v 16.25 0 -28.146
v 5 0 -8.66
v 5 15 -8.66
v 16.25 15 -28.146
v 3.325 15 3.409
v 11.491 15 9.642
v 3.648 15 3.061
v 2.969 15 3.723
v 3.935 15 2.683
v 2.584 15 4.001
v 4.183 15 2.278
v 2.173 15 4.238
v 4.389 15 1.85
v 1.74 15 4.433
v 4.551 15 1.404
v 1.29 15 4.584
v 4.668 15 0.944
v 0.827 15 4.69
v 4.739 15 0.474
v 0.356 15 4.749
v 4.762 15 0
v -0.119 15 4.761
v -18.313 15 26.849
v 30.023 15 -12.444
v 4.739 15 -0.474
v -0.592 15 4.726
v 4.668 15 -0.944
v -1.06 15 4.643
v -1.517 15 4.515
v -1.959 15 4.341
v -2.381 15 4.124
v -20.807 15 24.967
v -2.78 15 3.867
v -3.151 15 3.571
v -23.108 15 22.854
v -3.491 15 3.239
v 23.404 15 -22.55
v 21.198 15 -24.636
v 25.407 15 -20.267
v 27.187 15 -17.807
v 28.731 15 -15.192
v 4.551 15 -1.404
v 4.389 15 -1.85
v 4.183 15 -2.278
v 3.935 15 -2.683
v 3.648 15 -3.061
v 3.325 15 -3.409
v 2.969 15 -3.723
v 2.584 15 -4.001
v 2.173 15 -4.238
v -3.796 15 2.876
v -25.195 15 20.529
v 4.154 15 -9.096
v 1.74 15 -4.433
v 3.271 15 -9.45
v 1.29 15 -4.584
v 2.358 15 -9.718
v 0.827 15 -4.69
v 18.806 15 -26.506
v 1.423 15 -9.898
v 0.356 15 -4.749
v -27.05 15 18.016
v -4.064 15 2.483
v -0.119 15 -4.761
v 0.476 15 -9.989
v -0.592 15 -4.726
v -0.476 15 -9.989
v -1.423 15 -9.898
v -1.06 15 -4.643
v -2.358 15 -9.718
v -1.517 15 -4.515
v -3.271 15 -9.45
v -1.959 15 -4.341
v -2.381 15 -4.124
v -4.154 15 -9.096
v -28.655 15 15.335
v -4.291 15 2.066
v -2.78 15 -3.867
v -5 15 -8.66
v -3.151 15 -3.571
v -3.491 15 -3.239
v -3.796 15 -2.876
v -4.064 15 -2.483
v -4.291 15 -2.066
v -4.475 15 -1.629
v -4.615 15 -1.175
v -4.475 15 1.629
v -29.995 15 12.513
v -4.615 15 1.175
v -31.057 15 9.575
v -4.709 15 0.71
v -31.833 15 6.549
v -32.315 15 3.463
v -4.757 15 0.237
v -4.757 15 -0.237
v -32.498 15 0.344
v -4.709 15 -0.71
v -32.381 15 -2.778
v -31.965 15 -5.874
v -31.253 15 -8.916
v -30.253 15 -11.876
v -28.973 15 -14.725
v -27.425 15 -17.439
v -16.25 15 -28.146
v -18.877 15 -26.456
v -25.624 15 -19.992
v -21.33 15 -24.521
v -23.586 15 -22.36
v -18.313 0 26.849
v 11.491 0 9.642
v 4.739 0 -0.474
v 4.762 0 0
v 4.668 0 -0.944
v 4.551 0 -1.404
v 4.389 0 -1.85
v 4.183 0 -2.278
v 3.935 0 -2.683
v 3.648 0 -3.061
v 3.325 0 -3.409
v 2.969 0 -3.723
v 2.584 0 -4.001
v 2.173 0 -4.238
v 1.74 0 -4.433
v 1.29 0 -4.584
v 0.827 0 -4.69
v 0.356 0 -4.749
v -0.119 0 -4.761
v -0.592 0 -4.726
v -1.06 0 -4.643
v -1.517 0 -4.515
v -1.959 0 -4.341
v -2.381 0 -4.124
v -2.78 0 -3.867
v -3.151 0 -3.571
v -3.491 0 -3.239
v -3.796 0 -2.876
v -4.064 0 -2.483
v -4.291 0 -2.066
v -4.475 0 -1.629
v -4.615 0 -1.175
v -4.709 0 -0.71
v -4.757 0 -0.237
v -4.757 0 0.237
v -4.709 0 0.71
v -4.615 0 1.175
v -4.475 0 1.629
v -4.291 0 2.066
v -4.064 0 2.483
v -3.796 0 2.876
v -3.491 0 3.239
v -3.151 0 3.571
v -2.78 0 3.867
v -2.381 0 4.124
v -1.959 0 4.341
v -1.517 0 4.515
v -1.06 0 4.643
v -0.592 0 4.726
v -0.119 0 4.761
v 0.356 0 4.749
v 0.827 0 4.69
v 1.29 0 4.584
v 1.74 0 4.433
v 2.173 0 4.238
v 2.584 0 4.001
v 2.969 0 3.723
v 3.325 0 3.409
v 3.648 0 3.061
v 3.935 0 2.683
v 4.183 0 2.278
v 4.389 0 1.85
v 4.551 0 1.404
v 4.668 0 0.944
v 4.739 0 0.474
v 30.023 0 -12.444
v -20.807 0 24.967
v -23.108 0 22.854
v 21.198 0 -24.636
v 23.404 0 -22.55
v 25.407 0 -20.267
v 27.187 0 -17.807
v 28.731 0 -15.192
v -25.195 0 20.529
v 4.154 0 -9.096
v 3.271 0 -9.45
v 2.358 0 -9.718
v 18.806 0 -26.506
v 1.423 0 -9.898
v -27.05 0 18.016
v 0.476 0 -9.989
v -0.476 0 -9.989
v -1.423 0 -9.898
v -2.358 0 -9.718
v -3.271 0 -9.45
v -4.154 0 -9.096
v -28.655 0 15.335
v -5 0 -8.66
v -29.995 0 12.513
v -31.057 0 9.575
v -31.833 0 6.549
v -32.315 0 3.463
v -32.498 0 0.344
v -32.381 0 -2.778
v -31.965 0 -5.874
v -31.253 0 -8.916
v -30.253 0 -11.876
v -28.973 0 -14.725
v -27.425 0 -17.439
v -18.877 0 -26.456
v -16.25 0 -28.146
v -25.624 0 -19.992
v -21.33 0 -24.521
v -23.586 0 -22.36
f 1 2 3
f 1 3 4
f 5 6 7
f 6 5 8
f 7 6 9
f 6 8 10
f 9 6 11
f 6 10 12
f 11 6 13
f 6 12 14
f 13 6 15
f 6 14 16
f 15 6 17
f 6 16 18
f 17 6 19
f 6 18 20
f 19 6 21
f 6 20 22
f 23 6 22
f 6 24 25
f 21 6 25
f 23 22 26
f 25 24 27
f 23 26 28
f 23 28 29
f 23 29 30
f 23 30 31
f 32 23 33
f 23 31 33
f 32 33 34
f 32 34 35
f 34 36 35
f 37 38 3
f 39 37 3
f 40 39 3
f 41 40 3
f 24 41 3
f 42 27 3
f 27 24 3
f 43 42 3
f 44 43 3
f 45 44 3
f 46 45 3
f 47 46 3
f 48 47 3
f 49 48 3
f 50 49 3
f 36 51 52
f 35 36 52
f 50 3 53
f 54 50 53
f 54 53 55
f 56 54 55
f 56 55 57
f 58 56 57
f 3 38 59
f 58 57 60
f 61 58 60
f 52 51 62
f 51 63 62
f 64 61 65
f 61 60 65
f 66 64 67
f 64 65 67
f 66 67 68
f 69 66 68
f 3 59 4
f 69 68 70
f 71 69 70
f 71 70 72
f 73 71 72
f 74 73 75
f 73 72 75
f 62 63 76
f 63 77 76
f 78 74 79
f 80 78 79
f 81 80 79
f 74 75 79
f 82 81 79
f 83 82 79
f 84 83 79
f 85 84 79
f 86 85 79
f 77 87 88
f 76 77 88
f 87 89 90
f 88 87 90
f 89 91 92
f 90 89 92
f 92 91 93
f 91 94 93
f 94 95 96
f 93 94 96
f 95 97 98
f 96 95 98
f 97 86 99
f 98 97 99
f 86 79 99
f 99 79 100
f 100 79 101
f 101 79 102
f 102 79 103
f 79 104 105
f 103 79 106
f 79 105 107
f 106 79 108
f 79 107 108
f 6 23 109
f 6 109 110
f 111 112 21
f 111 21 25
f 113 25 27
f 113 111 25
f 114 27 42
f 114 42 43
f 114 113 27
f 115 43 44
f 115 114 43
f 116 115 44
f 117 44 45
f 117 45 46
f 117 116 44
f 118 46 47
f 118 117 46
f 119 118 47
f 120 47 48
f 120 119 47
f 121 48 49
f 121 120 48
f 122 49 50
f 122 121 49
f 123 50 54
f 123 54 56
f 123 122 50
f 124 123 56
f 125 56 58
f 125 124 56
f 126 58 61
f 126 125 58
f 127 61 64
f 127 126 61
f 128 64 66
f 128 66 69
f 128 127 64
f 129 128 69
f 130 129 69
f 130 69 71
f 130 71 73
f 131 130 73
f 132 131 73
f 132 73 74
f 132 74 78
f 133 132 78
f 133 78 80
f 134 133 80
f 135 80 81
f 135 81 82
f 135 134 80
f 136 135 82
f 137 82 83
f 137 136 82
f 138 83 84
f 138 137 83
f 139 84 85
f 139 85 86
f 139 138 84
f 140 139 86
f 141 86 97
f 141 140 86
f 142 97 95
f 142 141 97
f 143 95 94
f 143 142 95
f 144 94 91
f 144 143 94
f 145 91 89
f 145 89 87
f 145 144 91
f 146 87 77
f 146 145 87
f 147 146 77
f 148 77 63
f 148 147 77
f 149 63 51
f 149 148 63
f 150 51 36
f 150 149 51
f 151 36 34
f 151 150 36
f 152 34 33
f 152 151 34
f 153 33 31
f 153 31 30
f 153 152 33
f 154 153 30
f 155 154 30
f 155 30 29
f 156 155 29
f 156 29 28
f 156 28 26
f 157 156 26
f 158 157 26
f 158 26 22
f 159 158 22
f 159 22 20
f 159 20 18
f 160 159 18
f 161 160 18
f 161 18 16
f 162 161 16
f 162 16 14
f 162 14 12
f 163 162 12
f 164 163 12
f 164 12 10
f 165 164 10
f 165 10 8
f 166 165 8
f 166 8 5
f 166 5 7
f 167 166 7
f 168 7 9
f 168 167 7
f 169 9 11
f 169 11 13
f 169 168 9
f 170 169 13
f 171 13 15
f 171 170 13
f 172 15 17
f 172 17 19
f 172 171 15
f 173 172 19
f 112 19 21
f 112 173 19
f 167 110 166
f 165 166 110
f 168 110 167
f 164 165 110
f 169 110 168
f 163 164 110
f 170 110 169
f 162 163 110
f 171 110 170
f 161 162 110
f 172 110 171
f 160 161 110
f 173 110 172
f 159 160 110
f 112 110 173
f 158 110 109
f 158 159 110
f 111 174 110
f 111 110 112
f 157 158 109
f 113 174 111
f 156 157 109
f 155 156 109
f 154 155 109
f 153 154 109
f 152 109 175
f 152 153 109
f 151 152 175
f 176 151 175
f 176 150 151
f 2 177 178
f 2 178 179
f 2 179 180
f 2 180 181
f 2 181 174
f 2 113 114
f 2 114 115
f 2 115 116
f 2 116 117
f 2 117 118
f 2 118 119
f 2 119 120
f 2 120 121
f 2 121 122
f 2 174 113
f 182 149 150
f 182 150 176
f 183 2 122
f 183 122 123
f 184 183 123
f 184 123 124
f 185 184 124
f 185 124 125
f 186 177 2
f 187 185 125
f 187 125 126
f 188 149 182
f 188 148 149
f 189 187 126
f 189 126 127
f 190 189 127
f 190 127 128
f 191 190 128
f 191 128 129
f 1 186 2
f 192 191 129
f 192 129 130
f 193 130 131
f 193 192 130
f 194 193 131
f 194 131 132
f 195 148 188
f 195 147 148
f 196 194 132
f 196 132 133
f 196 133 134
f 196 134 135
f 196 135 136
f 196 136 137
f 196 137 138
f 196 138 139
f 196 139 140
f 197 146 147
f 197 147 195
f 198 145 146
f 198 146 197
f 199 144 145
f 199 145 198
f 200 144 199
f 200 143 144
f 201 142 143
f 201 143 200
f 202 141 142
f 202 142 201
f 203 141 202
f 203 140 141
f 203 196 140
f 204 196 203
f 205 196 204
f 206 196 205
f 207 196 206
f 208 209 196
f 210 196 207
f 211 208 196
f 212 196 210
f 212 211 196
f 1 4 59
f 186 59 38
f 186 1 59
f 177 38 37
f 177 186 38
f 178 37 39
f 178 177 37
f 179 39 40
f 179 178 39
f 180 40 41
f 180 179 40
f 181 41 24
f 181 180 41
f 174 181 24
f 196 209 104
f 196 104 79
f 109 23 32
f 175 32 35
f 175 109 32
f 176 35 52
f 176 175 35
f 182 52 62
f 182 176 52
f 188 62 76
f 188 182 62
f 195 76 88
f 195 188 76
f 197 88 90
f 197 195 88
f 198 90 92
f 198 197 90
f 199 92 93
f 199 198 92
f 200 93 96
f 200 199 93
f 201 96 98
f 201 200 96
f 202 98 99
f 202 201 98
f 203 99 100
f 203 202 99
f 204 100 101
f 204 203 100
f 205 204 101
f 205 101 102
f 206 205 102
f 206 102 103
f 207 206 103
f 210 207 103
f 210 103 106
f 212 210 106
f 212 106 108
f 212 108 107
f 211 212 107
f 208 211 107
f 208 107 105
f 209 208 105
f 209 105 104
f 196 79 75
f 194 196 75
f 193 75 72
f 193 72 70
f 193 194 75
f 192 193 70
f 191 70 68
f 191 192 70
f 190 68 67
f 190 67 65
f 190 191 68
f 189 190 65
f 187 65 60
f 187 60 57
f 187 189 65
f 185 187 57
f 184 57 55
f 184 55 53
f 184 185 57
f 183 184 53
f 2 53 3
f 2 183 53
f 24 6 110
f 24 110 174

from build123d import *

# Parameters (mm, degrees)
SKETCH1_R           = 4.7625
BOSS_EXTRUDE1_DEPTH = 15
CUT_EXTRUDE1_DEPTH  = 16


with BuildPart() as part:
    # Sketch1 → Boss-Extrude1 (new body)
    with BuildSketch(Plane(origin=(0, 0, 0), x_dir=(1, 0, 0), z_dir=(0, 1, 0))):
        with BuildLine():
            Line((-16.25, 28.145825623), (-5, 8.660254038))
            ThreePointArc((-5, 8.660254038), (0, 10), (5, 8.660254038))
            Line((5, 8.660254038), (16.25, 28.145825623))
            ThreePointArc((16.25, 28.145825623), (0, -32.5), (-16.25, 28.145825623))
        make_face()
        Circle(SKETCH1_R, mode=Mode.SUBTRACT)
    extrude(amount=BOSS_EXTRUDE1_DEPTH)

    # Sketch4 → Cut-Extrude1 (cut, through all)
    with BuildSketch(Plane(origin=(0, 15, 0), x_dir=(1, 0, 0), z_dir=(0, 1, 0))):
        with BuildLine():
            Line((11.490666647, -9.641814145), (45.503789868, 30.893447649))
            ThreePointArc((45.503789868, 30.893447649), (34.992750198, -42.432386612), (-38.992939572, -38.788537785))
            Line((-38.992939572, -38.788537785), (11.490666647, -9.641814145))
        make_face()
    extrude(amount=-CUT_EXTRUDE1_DEPTH, mode=Mode.SUBTRACT)


solid = part.part
